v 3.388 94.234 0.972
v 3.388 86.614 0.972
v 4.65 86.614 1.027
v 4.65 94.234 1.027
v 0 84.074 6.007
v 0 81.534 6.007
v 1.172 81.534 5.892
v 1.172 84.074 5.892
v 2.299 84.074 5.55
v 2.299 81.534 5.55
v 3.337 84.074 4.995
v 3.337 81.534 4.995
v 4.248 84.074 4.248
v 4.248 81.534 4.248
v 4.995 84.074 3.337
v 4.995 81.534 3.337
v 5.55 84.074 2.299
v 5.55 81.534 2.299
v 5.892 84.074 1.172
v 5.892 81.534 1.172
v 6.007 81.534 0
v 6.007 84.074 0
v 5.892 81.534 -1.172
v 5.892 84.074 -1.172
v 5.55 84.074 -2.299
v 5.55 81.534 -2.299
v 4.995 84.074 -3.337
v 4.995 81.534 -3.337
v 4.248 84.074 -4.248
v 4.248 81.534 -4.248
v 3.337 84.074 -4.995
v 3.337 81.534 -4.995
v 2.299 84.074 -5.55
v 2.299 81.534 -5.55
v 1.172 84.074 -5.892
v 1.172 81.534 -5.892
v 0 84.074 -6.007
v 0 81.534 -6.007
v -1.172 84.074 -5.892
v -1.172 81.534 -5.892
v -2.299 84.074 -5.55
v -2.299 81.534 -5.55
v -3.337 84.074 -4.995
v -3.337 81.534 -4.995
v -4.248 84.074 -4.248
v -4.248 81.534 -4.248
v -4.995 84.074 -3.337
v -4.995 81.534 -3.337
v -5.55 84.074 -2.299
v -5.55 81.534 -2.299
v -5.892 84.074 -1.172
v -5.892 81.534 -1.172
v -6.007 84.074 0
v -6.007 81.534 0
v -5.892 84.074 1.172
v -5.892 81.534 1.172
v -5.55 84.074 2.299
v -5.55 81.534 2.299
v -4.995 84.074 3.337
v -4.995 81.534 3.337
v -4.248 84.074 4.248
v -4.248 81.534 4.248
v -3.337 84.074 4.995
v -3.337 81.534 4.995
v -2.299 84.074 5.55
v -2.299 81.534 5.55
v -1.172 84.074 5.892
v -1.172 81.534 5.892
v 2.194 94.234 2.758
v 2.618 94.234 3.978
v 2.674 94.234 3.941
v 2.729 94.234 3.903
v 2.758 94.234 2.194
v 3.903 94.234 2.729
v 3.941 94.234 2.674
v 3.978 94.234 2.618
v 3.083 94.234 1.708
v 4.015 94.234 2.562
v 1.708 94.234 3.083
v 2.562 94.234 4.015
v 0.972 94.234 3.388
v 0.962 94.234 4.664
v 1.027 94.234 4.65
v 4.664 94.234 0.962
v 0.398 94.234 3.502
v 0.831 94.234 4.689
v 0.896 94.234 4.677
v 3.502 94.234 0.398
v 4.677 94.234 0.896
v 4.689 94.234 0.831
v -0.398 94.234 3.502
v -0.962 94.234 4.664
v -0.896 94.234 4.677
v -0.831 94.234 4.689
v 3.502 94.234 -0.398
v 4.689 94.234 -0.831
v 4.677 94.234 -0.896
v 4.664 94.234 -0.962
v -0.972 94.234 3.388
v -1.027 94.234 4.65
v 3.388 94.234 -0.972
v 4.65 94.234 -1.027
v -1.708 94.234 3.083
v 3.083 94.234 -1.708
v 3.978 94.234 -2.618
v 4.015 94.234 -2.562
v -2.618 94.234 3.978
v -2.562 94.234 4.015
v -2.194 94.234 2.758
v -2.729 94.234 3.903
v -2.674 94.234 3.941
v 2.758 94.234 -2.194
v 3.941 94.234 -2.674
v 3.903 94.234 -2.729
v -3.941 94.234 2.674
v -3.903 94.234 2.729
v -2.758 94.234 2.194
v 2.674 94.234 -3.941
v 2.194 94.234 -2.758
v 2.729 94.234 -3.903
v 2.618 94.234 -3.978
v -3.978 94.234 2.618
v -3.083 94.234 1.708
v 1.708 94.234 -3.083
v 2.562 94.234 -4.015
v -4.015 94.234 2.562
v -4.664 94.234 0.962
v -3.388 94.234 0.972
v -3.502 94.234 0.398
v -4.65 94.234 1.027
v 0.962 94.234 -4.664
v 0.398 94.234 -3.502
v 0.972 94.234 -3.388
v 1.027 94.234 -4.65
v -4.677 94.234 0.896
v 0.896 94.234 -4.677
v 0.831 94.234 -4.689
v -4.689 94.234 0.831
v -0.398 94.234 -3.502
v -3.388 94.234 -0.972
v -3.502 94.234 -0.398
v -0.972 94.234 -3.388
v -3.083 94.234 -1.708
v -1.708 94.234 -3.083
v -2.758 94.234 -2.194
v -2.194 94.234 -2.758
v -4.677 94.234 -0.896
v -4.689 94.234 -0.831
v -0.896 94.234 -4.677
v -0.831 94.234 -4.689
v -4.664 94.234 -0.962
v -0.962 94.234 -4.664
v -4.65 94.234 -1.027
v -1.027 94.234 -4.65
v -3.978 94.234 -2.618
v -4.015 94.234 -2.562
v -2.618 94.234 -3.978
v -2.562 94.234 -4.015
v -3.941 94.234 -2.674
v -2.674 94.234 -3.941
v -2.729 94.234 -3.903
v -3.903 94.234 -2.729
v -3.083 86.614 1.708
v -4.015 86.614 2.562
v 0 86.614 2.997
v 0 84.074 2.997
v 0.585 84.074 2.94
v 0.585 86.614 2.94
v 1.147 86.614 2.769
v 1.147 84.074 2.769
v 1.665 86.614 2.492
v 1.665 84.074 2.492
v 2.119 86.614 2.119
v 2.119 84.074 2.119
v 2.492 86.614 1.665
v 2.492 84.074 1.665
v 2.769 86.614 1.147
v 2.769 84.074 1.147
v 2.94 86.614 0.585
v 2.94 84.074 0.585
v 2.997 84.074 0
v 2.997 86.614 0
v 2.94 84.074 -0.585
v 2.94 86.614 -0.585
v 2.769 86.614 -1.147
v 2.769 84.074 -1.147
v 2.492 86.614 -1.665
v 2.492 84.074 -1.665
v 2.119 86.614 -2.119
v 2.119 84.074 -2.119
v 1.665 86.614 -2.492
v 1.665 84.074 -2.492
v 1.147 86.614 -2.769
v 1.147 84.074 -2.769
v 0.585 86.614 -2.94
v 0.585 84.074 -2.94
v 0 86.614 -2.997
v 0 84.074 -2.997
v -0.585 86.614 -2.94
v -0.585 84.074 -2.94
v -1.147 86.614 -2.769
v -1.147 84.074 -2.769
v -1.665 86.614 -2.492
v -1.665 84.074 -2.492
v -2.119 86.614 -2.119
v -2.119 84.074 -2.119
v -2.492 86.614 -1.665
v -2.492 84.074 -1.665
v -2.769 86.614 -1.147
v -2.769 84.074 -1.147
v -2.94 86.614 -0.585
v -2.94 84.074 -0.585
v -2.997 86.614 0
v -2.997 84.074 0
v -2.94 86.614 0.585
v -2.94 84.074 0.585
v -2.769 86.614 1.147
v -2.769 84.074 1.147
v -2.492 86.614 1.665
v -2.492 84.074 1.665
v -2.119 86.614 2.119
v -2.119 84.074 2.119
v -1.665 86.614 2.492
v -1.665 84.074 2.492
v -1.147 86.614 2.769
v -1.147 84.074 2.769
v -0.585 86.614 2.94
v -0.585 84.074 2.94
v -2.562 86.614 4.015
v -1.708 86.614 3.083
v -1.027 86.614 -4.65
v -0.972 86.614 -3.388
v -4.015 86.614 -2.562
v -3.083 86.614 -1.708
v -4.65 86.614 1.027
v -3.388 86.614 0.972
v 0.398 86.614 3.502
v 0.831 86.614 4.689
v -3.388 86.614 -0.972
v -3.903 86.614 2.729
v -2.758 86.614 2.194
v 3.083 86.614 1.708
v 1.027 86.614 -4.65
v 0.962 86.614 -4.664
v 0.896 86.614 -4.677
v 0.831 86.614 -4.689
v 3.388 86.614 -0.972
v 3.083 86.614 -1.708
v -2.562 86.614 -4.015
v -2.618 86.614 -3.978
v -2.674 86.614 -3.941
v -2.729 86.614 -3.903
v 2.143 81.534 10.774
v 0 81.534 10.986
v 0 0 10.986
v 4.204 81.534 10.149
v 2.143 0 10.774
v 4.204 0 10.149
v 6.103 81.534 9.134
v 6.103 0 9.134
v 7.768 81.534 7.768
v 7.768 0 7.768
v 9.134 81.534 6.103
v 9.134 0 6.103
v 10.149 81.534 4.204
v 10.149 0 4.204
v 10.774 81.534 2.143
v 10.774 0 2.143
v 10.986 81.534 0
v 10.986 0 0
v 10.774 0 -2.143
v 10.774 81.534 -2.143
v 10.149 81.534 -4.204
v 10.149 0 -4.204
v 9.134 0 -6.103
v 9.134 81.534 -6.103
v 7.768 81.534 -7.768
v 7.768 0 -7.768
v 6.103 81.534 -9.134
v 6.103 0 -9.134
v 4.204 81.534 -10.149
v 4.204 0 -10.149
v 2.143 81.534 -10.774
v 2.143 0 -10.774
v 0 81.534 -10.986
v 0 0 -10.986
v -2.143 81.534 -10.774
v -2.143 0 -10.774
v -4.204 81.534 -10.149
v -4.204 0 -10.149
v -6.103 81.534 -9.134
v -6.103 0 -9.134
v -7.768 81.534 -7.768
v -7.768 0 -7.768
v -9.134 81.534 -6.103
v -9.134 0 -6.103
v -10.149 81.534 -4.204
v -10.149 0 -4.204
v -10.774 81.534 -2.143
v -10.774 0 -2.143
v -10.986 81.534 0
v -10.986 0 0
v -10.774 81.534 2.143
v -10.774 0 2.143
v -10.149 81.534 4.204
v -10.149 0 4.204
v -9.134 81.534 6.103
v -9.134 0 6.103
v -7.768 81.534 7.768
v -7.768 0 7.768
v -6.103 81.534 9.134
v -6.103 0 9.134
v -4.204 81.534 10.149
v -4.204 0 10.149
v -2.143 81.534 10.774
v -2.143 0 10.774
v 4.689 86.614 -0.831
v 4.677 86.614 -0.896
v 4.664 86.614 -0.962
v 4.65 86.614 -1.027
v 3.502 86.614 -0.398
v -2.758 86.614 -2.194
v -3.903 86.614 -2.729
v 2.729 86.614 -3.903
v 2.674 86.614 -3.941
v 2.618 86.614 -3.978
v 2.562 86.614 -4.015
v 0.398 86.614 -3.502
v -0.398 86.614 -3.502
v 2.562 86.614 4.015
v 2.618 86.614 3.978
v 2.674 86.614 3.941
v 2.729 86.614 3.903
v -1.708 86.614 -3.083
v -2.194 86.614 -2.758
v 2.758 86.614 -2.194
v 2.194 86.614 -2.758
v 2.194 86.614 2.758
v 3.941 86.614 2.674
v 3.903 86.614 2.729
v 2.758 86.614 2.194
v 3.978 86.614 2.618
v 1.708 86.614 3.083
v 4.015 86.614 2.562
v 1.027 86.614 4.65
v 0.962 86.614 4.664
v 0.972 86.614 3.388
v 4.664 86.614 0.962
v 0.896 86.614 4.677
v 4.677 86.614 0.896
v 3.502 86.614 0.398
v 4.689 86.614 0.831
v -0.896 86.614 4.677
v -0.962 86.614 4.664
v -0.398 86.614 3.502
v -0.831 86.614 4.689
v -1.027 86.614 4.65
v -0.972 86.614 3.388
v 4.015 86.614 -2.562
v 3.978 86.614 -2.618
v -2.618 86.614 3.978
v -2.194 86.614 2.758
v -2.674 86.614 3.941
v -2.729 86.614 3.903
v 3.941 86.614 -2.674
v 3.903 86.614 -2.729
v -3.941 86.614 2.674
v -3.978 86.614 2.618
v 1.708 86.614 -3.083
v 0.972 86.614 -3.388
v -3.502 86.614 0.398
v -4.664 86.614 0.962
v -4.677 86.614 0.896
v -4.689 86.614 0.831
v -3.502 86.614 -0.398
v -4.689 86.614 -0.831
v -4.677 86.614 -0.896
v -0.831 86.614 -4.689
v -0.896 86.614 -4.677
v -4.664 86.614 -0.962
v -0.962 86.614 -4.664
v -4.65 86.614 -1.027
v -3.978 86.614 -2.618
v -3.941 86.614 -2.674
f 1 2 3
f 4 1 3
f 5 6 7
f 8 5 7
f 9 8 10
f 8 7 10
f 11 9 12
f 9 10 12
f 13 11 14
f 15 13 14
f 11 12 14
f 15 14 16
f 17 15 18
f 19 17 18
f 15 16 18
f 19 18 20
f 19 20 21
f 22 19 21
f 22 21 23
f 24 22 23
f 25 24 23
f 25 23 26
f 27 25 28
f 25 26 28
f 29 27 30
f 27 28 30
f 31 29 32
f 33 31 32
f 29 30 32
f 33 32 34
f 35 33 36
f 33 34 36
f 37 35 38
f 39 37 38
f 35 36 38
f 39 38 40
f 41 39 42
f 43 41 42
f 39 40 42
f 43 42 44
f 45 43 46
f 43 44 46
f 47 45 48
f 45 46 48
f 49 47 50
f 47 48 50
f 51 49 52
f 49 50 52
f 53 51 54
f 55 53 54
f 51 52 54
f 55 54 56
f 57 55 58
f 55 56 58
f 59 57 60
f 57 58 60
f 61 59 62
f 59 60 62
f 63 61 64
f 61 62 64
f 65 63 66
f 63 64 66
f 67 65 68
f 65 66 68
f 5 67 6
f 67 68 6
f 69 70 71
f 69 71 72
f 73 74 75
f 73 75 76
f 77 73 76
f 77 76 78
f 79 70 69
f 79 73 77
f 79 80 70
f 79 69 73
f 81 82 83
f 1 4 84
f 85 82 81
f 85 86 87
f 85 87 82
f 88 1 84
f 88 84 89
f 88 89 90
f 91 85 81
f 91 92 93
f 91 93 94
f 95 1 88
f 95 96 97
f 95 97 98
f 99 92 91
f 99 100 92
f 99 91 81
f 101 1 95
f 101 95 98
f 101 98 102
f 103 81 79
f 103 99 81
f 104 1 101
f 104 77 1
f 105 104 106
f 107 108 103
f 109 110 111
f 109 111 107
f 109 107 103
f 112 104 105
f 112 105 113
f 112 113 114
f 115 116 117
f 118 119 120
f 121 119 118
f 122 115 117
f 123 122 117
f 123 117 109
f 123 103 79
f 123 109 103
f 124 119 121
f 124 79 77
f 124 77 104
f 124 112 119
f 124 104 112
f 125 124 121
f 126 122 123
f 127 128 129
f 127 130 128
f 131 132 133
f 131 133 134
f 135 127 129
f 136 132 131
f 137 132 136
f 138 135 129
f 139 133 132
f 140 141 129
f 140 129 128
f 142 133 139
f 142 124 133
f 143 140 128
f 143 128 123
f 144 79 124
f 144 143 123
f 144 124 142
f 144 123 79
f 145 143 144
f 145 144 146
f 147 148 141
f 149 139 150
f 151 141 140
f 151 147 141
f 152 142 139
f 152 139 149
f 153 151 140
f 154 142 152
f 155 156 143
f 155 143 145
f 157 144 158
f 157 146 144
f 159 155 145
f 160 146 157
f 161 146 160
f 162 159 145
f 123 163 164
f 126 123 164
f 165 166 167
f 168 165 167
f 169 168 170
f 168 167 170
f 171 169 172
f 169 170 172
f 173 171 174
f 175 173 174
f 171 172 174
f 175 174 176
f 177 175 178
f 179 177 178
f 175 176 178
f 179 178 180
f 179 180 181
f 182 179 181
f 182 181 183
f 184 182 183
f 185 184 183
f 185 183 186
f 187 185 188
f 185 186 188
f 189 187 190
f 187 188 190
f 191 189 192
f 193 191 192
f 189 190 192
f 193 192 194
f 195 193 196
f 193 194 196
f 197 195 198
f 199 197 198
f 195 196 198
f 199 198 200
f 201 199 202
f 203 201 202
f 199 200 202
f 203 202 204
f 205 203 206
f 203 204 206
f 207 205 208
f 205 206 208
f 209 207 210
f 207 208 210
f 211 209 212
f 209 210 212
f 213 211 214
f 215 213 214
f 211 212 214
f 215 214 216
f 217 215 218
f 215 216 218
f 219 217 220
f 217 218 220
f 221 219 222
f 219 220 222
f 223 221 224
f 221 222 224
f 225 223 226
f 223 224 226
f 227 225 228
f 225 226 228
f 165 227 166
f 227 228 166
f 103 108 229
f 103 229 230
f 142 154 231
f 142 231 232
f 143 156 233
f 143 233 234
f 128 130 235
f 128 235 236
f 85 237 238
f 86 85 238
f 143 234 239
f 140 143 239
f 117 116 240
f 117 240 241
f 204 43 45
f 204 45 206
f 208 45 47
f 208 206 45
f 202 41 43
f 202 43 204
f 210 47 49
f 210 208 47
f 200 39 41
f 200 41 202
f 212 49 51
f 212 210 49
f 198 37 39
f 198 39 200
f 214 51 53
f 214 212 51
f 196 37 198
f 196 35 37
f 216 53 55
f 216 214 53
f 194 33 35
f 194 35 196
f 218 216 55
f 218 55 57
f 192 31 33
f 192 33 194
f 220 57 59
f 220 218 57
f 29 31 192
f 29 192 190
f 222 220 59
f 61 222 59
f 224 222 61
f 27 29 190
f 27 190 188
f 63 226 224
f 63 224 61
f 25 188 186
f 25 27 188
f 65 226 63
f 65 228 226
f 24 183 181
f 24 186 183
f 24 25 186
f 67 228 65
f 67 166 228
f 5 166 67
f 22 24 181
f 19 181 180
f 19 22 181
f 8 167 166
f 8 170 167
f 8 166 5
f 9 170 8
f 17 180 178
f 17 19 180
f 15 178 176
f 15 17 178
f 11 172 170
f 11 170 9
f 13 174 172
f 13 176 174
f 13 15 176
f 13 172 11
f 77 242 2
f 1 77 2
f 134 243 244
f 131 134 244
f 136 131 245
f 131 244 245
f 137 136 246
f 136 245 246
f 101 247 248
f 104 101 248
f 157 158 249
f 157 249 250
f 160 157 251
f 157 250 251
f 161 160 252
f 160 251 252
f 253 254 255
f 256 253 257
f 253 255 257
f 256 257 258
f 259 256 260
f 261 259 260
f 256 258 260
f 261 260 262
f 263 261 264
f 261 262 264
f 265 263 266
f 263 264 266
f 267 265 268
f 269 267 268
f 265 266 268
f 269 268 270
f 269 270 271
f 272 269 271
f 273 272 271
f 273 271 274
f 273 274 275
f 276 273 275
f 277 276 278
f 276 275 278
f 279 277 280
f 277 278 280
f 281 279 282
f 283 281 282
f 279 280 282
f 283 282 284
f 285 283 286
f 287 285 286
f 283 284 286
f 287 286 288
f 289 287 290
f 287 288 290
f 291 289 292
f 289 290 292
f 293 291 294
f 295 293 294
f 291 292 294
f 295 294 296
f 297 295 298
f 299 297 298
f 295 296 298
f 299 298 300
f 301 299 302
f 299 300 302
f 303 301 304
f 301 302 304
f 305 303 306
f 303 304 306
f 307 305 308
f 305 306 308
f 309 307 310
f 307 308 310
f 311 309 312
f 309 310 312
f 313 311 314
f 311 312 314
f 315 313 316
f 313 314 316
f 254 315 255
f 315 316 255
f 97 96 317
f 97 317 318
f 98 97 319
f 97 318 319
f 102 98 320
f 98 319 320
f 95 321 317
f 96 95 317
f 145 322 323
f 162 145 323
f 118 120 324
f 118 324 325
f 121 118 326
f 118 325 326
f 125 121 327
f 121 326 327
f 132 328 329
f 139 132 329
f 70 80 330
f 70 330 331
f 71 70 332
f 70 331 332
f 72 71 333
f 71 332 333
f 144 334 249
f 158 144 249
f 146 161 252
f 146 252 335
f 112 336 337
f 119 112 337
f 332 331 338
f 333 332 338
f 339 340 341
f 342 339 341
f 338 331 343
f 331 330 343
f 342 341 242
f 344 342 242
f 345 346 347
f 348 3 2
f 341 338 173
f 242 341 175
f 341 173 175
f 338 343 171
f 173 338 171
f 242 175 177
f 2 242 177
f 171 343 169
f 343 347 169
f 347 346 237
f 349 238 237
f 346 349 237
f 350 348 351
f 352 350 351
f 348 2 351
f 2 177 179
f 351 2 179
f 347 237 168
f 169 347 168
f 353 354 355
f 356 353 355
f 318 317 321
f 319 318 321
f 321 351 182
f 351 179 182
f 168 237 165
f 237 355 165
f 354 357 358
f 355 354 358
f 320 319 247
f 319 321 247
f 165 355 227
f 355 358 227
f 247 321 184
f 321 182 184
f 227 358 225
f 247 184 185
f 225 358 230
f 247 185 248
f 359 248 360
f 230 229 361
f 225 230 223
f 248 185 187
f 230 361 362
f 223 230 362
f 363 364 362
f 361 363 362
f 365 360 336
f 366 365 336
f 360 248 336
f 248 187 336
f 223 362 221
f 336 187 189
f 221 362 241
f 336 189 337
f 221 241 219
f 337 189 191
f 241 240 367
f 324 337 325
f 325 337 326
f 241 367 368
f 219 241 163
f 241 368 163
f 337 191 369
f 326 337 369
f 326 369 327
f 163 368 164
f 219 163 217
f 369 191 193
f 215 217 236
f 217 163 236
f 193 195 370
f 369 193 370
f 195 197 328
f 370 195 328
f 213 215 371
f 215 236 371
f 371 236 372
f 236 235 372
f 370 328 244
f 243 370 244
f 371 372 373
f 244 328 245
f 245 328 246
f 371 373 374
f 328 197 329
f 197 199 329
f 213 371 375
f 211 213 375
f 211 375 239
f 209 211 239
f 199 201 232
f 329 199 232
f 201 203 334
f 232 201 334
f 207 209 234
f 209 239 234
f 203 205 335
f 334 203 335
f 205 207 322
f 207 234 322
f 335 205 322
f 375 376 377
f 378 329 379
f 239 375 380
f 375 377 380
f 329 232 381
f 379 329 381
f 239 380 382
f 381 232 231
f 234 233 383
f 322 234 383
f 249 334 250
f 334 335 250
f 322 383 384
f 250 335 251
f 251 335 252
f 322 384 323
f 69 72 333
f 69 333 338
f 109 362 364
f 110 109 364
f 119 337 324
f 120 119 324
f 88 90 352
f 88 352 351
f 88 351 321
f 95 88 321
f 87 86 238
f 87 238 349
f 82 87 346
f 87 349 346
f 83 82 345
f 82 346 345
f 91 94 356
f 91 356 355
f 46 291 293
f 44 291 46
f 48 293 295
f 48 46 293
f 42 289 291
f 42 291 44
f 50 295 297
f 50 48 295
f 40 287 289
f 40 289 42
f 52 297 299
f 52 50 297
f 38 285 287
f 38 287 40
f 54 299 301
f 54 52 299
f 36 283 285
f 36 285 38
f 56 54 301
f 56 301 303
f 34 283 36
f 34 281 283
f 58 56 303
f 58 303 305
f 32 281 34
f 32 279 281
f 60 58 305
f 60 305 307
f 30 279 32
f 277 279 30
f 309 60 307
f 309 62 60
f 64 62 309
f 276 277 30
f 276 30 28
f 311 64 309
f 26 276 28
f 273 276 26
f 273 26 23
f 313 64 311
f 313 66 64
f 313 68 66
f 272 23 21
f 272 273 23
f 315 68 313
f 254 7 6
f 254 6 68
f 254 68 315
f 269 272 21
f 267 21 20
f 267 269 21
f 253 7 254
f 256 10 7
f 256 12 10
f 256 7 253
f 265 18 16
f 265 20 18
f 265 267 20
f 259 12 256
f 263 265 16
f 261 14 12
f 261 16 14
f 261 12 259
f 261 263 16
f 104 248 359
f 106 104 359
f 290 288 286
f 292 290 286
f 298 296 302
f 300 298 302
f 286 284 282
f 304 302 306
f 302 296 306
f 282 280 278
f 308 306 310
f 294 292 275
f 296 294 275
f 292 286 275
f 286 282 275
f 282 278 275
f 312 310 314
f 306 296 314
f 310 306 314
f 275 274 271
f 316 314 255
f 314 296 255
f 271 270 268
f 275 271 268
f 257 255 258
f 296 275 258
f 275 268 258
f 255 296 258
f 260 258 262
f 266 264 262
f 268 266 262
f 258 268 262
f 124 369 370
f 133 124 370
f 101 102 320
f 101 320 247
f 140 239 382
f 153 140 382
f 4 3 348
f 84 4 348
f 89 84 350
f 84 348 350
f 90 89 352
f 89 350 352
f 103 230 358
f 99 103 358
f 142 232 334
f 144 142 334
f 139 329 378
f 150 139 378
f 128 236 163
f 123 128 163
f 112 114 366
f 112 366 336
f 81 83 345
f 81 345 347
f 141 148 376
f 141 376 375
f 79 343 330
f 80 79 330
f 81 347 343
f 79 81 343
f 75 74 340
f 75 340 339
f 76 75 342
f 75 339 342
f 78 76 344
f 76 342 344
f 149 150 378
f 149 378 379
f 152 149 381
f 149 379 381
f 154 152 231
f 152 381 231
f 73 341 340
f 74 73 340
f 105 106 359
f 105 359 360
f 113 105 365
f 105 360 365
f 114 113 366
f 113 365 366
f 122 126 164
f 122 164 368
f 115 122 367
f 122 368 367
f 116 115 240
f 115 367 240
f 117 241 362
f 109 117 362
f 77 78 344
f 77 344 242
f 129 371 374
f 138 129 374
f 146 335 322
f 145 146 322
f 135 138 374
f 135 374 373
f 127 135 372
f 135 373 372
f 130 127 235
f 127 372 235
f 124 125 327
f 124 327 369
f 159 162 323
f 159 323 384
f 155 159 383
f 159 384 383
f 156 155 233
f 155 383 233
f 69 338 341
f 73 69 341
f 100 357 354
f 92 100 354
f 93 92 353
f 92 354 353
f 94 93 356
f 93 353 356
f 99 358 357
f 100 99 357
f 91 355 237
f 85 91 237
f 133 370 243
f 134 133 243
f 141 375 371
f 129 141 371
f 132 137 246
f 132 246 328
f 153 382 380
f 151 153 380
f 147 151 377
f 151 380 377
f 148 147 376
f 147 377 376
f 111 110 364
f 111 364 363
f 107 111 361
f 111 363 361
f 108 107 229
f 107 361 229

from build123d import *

# Parameters (mm, degrees)
SKETCH1_R           = 10.9855
BOSS_EXTRUDE1_DEPTH = 81.534
SKETCH2_R           = 6.0071
BOSS_EXTRUDE2_DEPTH = 2.54
SKETCH3_R           = 2.9972
BOSS_EXTRUDE3_DEPTH = 2.54
SKETCH4_R           = 4.7625
BOSS_EXTRUDE4_DEPTH = 7.62
CUT_EXTRUDE1_DEPTH  = 7.62


with BuildPart() as part:
    # Sketch1 → Boss-Extrude1 (new body)
    with BuildSketch(Plane(origin=(0, 0, 0), x_dir=(1, 0, 0), z_dir=(0, 1, 0))):
        with Locations(Location((0, 0, 0), (0, 0, 270))):
            Circle(SKETCH1_R)
    extrude(amount=BOSS_EXTRUDE1_DEPTH)

    # Sketch2 → Boss-Extrude2 (add)
    with BuildSketch(Plane(origin=(0, 81.534, 0), x_dir=(1, 0, 0), z_dir=(0, 1, 0))):
        with Locations(Location((0, 0, 0), (0, 0, 270))):
            Circle(SKETCH2_R)
    extrude(amount=BOSS_EXTRUDE2_DEPTH)

    # Sketch3 → Boss-Extrude3 (add)
    with BuildSketch(Plane(origin=(0, 84.074, 0), x_dir=(1, 0, 0), z_dir=(0, 1, 0))):
        with Locations(Location((0, 0, 0), (0, 0, 270))):
            Circle(SKETCH3_R)
    extrude(amount=BOSS_EXTRUDE3_DEPTH)

    # Sketch4 → Boss-Extrude4 (add)
    with BuildSketch(Plane(origin=(0, 86.614, 0), x_dir=(1, 0, 0), z_dir=(0, 1, 0))):
        with Locations(Location((0, 0, 0), (0, 0, 90))):
            Circle(SKETCH4_R)
    extrude(amount=BOSS_EXTRUDE4_DEPTH)

    # Sketch7 → Cut-Extrude1 (cut)
    with BuildSketch(Plane(origin=(0, 94.234, 0), x_dir=(1, 0, 0), z_dir=(0, 1, 0))):
        Polygon((-0.85725, 4.7625), (0.85725, 4.7625), (0.398425795, 3.501890859), (-0.398425795, 3.501890859), align=None)
        Polygon((1.708213051, 3.082854338), (0.972018176, 3.38779624), (1.030534117, 4.728031646), (2.614525576, 4.071920901), align=None)
        Polygon((2.757940355, 2.194481191), (2.194481191, 2.757940355), (2.761428757, 3.973763334), (3.973763334, 2.761428757), align=None)
        Polygon((3.38779624, 0.972018176), (3.082854338, 1.708213051), (4.071920901, 2.614525576), (4.728031646, 1.030534117), align=None)
        Polygon((3.501890859, -0.398425795), (3.501890859, 0.398425795), (4.7625, 0.85725), (4.7625, -0.85725), align=None)
        Polygon((3.082854338, -1.708213051), (3.38779624, -0.972018176), (4.728031646, -1.030534117), (4.071920901, -2.614525576), align=None)
        Polygon((2.194481191, -2.757940355), (2.757940355, -2.194481191), (3.973763334, -2.761428757), (2.761428757, -3.973763334), align=None)
        Polygon((0.972018176, -3.38779624), (1.708213051, -3.082854338), (2.614525576, -4.071920901), (1.030534117, -4.728031646), align=None)
        Polygon((-0.398425795, -3.501890859), (0.398425795, -3.501890859), (0.85725, -4.7625), (-0.85725, -4.7625), align=None)
        Polygon((-1.708213051, -3.082854338), (-0.972018176, -3.38779624), (-1.030534117, -4.728031646), (-2.614525576, -4.071920901), align=None)
        Polygon((-2.757940355, -2.194481191), (-2.194481191, -2.757940355), (-2.761428757, -3.973763334), (-3.973763334, -2.761428757), align=None)
        Polygon((-3.38779624, -0.972018176), (-3.082854338, -1.708213051), (-4.071920901, -2.614525576), (-4.728031646, -1.030534117), align=None)
        Polygon((-3.501890859, 0.398425795), (-3.501890859, -0.398425795), (-4.7625, -0.85725), (-4.7625, 0.85725), align=None)
        Polygon((-3.082854338, 1.708213051), (-3.38779624, 0.972018176), (-4.728031646, 1.030534117), (-4.071920901, 2.614525576), align=None)
        Polygon((-2.194481191, 2.757940355), (-2.757940355, 2.194481191), (-3.973763334, 2.761428757), (-2.761428757, 3.973763334), align=None)
        Polygon((-0.972018176, 3.38779624), (-1.708213051, 3.082854338), (-2.614525576, 4.071920901), (-1.030534117, 4.728031646), align=None)
    extrude(amount=-CUT_EXTRUDE1_DEPTH, mode=Mode.SUBTRACT)


solid = part.part
